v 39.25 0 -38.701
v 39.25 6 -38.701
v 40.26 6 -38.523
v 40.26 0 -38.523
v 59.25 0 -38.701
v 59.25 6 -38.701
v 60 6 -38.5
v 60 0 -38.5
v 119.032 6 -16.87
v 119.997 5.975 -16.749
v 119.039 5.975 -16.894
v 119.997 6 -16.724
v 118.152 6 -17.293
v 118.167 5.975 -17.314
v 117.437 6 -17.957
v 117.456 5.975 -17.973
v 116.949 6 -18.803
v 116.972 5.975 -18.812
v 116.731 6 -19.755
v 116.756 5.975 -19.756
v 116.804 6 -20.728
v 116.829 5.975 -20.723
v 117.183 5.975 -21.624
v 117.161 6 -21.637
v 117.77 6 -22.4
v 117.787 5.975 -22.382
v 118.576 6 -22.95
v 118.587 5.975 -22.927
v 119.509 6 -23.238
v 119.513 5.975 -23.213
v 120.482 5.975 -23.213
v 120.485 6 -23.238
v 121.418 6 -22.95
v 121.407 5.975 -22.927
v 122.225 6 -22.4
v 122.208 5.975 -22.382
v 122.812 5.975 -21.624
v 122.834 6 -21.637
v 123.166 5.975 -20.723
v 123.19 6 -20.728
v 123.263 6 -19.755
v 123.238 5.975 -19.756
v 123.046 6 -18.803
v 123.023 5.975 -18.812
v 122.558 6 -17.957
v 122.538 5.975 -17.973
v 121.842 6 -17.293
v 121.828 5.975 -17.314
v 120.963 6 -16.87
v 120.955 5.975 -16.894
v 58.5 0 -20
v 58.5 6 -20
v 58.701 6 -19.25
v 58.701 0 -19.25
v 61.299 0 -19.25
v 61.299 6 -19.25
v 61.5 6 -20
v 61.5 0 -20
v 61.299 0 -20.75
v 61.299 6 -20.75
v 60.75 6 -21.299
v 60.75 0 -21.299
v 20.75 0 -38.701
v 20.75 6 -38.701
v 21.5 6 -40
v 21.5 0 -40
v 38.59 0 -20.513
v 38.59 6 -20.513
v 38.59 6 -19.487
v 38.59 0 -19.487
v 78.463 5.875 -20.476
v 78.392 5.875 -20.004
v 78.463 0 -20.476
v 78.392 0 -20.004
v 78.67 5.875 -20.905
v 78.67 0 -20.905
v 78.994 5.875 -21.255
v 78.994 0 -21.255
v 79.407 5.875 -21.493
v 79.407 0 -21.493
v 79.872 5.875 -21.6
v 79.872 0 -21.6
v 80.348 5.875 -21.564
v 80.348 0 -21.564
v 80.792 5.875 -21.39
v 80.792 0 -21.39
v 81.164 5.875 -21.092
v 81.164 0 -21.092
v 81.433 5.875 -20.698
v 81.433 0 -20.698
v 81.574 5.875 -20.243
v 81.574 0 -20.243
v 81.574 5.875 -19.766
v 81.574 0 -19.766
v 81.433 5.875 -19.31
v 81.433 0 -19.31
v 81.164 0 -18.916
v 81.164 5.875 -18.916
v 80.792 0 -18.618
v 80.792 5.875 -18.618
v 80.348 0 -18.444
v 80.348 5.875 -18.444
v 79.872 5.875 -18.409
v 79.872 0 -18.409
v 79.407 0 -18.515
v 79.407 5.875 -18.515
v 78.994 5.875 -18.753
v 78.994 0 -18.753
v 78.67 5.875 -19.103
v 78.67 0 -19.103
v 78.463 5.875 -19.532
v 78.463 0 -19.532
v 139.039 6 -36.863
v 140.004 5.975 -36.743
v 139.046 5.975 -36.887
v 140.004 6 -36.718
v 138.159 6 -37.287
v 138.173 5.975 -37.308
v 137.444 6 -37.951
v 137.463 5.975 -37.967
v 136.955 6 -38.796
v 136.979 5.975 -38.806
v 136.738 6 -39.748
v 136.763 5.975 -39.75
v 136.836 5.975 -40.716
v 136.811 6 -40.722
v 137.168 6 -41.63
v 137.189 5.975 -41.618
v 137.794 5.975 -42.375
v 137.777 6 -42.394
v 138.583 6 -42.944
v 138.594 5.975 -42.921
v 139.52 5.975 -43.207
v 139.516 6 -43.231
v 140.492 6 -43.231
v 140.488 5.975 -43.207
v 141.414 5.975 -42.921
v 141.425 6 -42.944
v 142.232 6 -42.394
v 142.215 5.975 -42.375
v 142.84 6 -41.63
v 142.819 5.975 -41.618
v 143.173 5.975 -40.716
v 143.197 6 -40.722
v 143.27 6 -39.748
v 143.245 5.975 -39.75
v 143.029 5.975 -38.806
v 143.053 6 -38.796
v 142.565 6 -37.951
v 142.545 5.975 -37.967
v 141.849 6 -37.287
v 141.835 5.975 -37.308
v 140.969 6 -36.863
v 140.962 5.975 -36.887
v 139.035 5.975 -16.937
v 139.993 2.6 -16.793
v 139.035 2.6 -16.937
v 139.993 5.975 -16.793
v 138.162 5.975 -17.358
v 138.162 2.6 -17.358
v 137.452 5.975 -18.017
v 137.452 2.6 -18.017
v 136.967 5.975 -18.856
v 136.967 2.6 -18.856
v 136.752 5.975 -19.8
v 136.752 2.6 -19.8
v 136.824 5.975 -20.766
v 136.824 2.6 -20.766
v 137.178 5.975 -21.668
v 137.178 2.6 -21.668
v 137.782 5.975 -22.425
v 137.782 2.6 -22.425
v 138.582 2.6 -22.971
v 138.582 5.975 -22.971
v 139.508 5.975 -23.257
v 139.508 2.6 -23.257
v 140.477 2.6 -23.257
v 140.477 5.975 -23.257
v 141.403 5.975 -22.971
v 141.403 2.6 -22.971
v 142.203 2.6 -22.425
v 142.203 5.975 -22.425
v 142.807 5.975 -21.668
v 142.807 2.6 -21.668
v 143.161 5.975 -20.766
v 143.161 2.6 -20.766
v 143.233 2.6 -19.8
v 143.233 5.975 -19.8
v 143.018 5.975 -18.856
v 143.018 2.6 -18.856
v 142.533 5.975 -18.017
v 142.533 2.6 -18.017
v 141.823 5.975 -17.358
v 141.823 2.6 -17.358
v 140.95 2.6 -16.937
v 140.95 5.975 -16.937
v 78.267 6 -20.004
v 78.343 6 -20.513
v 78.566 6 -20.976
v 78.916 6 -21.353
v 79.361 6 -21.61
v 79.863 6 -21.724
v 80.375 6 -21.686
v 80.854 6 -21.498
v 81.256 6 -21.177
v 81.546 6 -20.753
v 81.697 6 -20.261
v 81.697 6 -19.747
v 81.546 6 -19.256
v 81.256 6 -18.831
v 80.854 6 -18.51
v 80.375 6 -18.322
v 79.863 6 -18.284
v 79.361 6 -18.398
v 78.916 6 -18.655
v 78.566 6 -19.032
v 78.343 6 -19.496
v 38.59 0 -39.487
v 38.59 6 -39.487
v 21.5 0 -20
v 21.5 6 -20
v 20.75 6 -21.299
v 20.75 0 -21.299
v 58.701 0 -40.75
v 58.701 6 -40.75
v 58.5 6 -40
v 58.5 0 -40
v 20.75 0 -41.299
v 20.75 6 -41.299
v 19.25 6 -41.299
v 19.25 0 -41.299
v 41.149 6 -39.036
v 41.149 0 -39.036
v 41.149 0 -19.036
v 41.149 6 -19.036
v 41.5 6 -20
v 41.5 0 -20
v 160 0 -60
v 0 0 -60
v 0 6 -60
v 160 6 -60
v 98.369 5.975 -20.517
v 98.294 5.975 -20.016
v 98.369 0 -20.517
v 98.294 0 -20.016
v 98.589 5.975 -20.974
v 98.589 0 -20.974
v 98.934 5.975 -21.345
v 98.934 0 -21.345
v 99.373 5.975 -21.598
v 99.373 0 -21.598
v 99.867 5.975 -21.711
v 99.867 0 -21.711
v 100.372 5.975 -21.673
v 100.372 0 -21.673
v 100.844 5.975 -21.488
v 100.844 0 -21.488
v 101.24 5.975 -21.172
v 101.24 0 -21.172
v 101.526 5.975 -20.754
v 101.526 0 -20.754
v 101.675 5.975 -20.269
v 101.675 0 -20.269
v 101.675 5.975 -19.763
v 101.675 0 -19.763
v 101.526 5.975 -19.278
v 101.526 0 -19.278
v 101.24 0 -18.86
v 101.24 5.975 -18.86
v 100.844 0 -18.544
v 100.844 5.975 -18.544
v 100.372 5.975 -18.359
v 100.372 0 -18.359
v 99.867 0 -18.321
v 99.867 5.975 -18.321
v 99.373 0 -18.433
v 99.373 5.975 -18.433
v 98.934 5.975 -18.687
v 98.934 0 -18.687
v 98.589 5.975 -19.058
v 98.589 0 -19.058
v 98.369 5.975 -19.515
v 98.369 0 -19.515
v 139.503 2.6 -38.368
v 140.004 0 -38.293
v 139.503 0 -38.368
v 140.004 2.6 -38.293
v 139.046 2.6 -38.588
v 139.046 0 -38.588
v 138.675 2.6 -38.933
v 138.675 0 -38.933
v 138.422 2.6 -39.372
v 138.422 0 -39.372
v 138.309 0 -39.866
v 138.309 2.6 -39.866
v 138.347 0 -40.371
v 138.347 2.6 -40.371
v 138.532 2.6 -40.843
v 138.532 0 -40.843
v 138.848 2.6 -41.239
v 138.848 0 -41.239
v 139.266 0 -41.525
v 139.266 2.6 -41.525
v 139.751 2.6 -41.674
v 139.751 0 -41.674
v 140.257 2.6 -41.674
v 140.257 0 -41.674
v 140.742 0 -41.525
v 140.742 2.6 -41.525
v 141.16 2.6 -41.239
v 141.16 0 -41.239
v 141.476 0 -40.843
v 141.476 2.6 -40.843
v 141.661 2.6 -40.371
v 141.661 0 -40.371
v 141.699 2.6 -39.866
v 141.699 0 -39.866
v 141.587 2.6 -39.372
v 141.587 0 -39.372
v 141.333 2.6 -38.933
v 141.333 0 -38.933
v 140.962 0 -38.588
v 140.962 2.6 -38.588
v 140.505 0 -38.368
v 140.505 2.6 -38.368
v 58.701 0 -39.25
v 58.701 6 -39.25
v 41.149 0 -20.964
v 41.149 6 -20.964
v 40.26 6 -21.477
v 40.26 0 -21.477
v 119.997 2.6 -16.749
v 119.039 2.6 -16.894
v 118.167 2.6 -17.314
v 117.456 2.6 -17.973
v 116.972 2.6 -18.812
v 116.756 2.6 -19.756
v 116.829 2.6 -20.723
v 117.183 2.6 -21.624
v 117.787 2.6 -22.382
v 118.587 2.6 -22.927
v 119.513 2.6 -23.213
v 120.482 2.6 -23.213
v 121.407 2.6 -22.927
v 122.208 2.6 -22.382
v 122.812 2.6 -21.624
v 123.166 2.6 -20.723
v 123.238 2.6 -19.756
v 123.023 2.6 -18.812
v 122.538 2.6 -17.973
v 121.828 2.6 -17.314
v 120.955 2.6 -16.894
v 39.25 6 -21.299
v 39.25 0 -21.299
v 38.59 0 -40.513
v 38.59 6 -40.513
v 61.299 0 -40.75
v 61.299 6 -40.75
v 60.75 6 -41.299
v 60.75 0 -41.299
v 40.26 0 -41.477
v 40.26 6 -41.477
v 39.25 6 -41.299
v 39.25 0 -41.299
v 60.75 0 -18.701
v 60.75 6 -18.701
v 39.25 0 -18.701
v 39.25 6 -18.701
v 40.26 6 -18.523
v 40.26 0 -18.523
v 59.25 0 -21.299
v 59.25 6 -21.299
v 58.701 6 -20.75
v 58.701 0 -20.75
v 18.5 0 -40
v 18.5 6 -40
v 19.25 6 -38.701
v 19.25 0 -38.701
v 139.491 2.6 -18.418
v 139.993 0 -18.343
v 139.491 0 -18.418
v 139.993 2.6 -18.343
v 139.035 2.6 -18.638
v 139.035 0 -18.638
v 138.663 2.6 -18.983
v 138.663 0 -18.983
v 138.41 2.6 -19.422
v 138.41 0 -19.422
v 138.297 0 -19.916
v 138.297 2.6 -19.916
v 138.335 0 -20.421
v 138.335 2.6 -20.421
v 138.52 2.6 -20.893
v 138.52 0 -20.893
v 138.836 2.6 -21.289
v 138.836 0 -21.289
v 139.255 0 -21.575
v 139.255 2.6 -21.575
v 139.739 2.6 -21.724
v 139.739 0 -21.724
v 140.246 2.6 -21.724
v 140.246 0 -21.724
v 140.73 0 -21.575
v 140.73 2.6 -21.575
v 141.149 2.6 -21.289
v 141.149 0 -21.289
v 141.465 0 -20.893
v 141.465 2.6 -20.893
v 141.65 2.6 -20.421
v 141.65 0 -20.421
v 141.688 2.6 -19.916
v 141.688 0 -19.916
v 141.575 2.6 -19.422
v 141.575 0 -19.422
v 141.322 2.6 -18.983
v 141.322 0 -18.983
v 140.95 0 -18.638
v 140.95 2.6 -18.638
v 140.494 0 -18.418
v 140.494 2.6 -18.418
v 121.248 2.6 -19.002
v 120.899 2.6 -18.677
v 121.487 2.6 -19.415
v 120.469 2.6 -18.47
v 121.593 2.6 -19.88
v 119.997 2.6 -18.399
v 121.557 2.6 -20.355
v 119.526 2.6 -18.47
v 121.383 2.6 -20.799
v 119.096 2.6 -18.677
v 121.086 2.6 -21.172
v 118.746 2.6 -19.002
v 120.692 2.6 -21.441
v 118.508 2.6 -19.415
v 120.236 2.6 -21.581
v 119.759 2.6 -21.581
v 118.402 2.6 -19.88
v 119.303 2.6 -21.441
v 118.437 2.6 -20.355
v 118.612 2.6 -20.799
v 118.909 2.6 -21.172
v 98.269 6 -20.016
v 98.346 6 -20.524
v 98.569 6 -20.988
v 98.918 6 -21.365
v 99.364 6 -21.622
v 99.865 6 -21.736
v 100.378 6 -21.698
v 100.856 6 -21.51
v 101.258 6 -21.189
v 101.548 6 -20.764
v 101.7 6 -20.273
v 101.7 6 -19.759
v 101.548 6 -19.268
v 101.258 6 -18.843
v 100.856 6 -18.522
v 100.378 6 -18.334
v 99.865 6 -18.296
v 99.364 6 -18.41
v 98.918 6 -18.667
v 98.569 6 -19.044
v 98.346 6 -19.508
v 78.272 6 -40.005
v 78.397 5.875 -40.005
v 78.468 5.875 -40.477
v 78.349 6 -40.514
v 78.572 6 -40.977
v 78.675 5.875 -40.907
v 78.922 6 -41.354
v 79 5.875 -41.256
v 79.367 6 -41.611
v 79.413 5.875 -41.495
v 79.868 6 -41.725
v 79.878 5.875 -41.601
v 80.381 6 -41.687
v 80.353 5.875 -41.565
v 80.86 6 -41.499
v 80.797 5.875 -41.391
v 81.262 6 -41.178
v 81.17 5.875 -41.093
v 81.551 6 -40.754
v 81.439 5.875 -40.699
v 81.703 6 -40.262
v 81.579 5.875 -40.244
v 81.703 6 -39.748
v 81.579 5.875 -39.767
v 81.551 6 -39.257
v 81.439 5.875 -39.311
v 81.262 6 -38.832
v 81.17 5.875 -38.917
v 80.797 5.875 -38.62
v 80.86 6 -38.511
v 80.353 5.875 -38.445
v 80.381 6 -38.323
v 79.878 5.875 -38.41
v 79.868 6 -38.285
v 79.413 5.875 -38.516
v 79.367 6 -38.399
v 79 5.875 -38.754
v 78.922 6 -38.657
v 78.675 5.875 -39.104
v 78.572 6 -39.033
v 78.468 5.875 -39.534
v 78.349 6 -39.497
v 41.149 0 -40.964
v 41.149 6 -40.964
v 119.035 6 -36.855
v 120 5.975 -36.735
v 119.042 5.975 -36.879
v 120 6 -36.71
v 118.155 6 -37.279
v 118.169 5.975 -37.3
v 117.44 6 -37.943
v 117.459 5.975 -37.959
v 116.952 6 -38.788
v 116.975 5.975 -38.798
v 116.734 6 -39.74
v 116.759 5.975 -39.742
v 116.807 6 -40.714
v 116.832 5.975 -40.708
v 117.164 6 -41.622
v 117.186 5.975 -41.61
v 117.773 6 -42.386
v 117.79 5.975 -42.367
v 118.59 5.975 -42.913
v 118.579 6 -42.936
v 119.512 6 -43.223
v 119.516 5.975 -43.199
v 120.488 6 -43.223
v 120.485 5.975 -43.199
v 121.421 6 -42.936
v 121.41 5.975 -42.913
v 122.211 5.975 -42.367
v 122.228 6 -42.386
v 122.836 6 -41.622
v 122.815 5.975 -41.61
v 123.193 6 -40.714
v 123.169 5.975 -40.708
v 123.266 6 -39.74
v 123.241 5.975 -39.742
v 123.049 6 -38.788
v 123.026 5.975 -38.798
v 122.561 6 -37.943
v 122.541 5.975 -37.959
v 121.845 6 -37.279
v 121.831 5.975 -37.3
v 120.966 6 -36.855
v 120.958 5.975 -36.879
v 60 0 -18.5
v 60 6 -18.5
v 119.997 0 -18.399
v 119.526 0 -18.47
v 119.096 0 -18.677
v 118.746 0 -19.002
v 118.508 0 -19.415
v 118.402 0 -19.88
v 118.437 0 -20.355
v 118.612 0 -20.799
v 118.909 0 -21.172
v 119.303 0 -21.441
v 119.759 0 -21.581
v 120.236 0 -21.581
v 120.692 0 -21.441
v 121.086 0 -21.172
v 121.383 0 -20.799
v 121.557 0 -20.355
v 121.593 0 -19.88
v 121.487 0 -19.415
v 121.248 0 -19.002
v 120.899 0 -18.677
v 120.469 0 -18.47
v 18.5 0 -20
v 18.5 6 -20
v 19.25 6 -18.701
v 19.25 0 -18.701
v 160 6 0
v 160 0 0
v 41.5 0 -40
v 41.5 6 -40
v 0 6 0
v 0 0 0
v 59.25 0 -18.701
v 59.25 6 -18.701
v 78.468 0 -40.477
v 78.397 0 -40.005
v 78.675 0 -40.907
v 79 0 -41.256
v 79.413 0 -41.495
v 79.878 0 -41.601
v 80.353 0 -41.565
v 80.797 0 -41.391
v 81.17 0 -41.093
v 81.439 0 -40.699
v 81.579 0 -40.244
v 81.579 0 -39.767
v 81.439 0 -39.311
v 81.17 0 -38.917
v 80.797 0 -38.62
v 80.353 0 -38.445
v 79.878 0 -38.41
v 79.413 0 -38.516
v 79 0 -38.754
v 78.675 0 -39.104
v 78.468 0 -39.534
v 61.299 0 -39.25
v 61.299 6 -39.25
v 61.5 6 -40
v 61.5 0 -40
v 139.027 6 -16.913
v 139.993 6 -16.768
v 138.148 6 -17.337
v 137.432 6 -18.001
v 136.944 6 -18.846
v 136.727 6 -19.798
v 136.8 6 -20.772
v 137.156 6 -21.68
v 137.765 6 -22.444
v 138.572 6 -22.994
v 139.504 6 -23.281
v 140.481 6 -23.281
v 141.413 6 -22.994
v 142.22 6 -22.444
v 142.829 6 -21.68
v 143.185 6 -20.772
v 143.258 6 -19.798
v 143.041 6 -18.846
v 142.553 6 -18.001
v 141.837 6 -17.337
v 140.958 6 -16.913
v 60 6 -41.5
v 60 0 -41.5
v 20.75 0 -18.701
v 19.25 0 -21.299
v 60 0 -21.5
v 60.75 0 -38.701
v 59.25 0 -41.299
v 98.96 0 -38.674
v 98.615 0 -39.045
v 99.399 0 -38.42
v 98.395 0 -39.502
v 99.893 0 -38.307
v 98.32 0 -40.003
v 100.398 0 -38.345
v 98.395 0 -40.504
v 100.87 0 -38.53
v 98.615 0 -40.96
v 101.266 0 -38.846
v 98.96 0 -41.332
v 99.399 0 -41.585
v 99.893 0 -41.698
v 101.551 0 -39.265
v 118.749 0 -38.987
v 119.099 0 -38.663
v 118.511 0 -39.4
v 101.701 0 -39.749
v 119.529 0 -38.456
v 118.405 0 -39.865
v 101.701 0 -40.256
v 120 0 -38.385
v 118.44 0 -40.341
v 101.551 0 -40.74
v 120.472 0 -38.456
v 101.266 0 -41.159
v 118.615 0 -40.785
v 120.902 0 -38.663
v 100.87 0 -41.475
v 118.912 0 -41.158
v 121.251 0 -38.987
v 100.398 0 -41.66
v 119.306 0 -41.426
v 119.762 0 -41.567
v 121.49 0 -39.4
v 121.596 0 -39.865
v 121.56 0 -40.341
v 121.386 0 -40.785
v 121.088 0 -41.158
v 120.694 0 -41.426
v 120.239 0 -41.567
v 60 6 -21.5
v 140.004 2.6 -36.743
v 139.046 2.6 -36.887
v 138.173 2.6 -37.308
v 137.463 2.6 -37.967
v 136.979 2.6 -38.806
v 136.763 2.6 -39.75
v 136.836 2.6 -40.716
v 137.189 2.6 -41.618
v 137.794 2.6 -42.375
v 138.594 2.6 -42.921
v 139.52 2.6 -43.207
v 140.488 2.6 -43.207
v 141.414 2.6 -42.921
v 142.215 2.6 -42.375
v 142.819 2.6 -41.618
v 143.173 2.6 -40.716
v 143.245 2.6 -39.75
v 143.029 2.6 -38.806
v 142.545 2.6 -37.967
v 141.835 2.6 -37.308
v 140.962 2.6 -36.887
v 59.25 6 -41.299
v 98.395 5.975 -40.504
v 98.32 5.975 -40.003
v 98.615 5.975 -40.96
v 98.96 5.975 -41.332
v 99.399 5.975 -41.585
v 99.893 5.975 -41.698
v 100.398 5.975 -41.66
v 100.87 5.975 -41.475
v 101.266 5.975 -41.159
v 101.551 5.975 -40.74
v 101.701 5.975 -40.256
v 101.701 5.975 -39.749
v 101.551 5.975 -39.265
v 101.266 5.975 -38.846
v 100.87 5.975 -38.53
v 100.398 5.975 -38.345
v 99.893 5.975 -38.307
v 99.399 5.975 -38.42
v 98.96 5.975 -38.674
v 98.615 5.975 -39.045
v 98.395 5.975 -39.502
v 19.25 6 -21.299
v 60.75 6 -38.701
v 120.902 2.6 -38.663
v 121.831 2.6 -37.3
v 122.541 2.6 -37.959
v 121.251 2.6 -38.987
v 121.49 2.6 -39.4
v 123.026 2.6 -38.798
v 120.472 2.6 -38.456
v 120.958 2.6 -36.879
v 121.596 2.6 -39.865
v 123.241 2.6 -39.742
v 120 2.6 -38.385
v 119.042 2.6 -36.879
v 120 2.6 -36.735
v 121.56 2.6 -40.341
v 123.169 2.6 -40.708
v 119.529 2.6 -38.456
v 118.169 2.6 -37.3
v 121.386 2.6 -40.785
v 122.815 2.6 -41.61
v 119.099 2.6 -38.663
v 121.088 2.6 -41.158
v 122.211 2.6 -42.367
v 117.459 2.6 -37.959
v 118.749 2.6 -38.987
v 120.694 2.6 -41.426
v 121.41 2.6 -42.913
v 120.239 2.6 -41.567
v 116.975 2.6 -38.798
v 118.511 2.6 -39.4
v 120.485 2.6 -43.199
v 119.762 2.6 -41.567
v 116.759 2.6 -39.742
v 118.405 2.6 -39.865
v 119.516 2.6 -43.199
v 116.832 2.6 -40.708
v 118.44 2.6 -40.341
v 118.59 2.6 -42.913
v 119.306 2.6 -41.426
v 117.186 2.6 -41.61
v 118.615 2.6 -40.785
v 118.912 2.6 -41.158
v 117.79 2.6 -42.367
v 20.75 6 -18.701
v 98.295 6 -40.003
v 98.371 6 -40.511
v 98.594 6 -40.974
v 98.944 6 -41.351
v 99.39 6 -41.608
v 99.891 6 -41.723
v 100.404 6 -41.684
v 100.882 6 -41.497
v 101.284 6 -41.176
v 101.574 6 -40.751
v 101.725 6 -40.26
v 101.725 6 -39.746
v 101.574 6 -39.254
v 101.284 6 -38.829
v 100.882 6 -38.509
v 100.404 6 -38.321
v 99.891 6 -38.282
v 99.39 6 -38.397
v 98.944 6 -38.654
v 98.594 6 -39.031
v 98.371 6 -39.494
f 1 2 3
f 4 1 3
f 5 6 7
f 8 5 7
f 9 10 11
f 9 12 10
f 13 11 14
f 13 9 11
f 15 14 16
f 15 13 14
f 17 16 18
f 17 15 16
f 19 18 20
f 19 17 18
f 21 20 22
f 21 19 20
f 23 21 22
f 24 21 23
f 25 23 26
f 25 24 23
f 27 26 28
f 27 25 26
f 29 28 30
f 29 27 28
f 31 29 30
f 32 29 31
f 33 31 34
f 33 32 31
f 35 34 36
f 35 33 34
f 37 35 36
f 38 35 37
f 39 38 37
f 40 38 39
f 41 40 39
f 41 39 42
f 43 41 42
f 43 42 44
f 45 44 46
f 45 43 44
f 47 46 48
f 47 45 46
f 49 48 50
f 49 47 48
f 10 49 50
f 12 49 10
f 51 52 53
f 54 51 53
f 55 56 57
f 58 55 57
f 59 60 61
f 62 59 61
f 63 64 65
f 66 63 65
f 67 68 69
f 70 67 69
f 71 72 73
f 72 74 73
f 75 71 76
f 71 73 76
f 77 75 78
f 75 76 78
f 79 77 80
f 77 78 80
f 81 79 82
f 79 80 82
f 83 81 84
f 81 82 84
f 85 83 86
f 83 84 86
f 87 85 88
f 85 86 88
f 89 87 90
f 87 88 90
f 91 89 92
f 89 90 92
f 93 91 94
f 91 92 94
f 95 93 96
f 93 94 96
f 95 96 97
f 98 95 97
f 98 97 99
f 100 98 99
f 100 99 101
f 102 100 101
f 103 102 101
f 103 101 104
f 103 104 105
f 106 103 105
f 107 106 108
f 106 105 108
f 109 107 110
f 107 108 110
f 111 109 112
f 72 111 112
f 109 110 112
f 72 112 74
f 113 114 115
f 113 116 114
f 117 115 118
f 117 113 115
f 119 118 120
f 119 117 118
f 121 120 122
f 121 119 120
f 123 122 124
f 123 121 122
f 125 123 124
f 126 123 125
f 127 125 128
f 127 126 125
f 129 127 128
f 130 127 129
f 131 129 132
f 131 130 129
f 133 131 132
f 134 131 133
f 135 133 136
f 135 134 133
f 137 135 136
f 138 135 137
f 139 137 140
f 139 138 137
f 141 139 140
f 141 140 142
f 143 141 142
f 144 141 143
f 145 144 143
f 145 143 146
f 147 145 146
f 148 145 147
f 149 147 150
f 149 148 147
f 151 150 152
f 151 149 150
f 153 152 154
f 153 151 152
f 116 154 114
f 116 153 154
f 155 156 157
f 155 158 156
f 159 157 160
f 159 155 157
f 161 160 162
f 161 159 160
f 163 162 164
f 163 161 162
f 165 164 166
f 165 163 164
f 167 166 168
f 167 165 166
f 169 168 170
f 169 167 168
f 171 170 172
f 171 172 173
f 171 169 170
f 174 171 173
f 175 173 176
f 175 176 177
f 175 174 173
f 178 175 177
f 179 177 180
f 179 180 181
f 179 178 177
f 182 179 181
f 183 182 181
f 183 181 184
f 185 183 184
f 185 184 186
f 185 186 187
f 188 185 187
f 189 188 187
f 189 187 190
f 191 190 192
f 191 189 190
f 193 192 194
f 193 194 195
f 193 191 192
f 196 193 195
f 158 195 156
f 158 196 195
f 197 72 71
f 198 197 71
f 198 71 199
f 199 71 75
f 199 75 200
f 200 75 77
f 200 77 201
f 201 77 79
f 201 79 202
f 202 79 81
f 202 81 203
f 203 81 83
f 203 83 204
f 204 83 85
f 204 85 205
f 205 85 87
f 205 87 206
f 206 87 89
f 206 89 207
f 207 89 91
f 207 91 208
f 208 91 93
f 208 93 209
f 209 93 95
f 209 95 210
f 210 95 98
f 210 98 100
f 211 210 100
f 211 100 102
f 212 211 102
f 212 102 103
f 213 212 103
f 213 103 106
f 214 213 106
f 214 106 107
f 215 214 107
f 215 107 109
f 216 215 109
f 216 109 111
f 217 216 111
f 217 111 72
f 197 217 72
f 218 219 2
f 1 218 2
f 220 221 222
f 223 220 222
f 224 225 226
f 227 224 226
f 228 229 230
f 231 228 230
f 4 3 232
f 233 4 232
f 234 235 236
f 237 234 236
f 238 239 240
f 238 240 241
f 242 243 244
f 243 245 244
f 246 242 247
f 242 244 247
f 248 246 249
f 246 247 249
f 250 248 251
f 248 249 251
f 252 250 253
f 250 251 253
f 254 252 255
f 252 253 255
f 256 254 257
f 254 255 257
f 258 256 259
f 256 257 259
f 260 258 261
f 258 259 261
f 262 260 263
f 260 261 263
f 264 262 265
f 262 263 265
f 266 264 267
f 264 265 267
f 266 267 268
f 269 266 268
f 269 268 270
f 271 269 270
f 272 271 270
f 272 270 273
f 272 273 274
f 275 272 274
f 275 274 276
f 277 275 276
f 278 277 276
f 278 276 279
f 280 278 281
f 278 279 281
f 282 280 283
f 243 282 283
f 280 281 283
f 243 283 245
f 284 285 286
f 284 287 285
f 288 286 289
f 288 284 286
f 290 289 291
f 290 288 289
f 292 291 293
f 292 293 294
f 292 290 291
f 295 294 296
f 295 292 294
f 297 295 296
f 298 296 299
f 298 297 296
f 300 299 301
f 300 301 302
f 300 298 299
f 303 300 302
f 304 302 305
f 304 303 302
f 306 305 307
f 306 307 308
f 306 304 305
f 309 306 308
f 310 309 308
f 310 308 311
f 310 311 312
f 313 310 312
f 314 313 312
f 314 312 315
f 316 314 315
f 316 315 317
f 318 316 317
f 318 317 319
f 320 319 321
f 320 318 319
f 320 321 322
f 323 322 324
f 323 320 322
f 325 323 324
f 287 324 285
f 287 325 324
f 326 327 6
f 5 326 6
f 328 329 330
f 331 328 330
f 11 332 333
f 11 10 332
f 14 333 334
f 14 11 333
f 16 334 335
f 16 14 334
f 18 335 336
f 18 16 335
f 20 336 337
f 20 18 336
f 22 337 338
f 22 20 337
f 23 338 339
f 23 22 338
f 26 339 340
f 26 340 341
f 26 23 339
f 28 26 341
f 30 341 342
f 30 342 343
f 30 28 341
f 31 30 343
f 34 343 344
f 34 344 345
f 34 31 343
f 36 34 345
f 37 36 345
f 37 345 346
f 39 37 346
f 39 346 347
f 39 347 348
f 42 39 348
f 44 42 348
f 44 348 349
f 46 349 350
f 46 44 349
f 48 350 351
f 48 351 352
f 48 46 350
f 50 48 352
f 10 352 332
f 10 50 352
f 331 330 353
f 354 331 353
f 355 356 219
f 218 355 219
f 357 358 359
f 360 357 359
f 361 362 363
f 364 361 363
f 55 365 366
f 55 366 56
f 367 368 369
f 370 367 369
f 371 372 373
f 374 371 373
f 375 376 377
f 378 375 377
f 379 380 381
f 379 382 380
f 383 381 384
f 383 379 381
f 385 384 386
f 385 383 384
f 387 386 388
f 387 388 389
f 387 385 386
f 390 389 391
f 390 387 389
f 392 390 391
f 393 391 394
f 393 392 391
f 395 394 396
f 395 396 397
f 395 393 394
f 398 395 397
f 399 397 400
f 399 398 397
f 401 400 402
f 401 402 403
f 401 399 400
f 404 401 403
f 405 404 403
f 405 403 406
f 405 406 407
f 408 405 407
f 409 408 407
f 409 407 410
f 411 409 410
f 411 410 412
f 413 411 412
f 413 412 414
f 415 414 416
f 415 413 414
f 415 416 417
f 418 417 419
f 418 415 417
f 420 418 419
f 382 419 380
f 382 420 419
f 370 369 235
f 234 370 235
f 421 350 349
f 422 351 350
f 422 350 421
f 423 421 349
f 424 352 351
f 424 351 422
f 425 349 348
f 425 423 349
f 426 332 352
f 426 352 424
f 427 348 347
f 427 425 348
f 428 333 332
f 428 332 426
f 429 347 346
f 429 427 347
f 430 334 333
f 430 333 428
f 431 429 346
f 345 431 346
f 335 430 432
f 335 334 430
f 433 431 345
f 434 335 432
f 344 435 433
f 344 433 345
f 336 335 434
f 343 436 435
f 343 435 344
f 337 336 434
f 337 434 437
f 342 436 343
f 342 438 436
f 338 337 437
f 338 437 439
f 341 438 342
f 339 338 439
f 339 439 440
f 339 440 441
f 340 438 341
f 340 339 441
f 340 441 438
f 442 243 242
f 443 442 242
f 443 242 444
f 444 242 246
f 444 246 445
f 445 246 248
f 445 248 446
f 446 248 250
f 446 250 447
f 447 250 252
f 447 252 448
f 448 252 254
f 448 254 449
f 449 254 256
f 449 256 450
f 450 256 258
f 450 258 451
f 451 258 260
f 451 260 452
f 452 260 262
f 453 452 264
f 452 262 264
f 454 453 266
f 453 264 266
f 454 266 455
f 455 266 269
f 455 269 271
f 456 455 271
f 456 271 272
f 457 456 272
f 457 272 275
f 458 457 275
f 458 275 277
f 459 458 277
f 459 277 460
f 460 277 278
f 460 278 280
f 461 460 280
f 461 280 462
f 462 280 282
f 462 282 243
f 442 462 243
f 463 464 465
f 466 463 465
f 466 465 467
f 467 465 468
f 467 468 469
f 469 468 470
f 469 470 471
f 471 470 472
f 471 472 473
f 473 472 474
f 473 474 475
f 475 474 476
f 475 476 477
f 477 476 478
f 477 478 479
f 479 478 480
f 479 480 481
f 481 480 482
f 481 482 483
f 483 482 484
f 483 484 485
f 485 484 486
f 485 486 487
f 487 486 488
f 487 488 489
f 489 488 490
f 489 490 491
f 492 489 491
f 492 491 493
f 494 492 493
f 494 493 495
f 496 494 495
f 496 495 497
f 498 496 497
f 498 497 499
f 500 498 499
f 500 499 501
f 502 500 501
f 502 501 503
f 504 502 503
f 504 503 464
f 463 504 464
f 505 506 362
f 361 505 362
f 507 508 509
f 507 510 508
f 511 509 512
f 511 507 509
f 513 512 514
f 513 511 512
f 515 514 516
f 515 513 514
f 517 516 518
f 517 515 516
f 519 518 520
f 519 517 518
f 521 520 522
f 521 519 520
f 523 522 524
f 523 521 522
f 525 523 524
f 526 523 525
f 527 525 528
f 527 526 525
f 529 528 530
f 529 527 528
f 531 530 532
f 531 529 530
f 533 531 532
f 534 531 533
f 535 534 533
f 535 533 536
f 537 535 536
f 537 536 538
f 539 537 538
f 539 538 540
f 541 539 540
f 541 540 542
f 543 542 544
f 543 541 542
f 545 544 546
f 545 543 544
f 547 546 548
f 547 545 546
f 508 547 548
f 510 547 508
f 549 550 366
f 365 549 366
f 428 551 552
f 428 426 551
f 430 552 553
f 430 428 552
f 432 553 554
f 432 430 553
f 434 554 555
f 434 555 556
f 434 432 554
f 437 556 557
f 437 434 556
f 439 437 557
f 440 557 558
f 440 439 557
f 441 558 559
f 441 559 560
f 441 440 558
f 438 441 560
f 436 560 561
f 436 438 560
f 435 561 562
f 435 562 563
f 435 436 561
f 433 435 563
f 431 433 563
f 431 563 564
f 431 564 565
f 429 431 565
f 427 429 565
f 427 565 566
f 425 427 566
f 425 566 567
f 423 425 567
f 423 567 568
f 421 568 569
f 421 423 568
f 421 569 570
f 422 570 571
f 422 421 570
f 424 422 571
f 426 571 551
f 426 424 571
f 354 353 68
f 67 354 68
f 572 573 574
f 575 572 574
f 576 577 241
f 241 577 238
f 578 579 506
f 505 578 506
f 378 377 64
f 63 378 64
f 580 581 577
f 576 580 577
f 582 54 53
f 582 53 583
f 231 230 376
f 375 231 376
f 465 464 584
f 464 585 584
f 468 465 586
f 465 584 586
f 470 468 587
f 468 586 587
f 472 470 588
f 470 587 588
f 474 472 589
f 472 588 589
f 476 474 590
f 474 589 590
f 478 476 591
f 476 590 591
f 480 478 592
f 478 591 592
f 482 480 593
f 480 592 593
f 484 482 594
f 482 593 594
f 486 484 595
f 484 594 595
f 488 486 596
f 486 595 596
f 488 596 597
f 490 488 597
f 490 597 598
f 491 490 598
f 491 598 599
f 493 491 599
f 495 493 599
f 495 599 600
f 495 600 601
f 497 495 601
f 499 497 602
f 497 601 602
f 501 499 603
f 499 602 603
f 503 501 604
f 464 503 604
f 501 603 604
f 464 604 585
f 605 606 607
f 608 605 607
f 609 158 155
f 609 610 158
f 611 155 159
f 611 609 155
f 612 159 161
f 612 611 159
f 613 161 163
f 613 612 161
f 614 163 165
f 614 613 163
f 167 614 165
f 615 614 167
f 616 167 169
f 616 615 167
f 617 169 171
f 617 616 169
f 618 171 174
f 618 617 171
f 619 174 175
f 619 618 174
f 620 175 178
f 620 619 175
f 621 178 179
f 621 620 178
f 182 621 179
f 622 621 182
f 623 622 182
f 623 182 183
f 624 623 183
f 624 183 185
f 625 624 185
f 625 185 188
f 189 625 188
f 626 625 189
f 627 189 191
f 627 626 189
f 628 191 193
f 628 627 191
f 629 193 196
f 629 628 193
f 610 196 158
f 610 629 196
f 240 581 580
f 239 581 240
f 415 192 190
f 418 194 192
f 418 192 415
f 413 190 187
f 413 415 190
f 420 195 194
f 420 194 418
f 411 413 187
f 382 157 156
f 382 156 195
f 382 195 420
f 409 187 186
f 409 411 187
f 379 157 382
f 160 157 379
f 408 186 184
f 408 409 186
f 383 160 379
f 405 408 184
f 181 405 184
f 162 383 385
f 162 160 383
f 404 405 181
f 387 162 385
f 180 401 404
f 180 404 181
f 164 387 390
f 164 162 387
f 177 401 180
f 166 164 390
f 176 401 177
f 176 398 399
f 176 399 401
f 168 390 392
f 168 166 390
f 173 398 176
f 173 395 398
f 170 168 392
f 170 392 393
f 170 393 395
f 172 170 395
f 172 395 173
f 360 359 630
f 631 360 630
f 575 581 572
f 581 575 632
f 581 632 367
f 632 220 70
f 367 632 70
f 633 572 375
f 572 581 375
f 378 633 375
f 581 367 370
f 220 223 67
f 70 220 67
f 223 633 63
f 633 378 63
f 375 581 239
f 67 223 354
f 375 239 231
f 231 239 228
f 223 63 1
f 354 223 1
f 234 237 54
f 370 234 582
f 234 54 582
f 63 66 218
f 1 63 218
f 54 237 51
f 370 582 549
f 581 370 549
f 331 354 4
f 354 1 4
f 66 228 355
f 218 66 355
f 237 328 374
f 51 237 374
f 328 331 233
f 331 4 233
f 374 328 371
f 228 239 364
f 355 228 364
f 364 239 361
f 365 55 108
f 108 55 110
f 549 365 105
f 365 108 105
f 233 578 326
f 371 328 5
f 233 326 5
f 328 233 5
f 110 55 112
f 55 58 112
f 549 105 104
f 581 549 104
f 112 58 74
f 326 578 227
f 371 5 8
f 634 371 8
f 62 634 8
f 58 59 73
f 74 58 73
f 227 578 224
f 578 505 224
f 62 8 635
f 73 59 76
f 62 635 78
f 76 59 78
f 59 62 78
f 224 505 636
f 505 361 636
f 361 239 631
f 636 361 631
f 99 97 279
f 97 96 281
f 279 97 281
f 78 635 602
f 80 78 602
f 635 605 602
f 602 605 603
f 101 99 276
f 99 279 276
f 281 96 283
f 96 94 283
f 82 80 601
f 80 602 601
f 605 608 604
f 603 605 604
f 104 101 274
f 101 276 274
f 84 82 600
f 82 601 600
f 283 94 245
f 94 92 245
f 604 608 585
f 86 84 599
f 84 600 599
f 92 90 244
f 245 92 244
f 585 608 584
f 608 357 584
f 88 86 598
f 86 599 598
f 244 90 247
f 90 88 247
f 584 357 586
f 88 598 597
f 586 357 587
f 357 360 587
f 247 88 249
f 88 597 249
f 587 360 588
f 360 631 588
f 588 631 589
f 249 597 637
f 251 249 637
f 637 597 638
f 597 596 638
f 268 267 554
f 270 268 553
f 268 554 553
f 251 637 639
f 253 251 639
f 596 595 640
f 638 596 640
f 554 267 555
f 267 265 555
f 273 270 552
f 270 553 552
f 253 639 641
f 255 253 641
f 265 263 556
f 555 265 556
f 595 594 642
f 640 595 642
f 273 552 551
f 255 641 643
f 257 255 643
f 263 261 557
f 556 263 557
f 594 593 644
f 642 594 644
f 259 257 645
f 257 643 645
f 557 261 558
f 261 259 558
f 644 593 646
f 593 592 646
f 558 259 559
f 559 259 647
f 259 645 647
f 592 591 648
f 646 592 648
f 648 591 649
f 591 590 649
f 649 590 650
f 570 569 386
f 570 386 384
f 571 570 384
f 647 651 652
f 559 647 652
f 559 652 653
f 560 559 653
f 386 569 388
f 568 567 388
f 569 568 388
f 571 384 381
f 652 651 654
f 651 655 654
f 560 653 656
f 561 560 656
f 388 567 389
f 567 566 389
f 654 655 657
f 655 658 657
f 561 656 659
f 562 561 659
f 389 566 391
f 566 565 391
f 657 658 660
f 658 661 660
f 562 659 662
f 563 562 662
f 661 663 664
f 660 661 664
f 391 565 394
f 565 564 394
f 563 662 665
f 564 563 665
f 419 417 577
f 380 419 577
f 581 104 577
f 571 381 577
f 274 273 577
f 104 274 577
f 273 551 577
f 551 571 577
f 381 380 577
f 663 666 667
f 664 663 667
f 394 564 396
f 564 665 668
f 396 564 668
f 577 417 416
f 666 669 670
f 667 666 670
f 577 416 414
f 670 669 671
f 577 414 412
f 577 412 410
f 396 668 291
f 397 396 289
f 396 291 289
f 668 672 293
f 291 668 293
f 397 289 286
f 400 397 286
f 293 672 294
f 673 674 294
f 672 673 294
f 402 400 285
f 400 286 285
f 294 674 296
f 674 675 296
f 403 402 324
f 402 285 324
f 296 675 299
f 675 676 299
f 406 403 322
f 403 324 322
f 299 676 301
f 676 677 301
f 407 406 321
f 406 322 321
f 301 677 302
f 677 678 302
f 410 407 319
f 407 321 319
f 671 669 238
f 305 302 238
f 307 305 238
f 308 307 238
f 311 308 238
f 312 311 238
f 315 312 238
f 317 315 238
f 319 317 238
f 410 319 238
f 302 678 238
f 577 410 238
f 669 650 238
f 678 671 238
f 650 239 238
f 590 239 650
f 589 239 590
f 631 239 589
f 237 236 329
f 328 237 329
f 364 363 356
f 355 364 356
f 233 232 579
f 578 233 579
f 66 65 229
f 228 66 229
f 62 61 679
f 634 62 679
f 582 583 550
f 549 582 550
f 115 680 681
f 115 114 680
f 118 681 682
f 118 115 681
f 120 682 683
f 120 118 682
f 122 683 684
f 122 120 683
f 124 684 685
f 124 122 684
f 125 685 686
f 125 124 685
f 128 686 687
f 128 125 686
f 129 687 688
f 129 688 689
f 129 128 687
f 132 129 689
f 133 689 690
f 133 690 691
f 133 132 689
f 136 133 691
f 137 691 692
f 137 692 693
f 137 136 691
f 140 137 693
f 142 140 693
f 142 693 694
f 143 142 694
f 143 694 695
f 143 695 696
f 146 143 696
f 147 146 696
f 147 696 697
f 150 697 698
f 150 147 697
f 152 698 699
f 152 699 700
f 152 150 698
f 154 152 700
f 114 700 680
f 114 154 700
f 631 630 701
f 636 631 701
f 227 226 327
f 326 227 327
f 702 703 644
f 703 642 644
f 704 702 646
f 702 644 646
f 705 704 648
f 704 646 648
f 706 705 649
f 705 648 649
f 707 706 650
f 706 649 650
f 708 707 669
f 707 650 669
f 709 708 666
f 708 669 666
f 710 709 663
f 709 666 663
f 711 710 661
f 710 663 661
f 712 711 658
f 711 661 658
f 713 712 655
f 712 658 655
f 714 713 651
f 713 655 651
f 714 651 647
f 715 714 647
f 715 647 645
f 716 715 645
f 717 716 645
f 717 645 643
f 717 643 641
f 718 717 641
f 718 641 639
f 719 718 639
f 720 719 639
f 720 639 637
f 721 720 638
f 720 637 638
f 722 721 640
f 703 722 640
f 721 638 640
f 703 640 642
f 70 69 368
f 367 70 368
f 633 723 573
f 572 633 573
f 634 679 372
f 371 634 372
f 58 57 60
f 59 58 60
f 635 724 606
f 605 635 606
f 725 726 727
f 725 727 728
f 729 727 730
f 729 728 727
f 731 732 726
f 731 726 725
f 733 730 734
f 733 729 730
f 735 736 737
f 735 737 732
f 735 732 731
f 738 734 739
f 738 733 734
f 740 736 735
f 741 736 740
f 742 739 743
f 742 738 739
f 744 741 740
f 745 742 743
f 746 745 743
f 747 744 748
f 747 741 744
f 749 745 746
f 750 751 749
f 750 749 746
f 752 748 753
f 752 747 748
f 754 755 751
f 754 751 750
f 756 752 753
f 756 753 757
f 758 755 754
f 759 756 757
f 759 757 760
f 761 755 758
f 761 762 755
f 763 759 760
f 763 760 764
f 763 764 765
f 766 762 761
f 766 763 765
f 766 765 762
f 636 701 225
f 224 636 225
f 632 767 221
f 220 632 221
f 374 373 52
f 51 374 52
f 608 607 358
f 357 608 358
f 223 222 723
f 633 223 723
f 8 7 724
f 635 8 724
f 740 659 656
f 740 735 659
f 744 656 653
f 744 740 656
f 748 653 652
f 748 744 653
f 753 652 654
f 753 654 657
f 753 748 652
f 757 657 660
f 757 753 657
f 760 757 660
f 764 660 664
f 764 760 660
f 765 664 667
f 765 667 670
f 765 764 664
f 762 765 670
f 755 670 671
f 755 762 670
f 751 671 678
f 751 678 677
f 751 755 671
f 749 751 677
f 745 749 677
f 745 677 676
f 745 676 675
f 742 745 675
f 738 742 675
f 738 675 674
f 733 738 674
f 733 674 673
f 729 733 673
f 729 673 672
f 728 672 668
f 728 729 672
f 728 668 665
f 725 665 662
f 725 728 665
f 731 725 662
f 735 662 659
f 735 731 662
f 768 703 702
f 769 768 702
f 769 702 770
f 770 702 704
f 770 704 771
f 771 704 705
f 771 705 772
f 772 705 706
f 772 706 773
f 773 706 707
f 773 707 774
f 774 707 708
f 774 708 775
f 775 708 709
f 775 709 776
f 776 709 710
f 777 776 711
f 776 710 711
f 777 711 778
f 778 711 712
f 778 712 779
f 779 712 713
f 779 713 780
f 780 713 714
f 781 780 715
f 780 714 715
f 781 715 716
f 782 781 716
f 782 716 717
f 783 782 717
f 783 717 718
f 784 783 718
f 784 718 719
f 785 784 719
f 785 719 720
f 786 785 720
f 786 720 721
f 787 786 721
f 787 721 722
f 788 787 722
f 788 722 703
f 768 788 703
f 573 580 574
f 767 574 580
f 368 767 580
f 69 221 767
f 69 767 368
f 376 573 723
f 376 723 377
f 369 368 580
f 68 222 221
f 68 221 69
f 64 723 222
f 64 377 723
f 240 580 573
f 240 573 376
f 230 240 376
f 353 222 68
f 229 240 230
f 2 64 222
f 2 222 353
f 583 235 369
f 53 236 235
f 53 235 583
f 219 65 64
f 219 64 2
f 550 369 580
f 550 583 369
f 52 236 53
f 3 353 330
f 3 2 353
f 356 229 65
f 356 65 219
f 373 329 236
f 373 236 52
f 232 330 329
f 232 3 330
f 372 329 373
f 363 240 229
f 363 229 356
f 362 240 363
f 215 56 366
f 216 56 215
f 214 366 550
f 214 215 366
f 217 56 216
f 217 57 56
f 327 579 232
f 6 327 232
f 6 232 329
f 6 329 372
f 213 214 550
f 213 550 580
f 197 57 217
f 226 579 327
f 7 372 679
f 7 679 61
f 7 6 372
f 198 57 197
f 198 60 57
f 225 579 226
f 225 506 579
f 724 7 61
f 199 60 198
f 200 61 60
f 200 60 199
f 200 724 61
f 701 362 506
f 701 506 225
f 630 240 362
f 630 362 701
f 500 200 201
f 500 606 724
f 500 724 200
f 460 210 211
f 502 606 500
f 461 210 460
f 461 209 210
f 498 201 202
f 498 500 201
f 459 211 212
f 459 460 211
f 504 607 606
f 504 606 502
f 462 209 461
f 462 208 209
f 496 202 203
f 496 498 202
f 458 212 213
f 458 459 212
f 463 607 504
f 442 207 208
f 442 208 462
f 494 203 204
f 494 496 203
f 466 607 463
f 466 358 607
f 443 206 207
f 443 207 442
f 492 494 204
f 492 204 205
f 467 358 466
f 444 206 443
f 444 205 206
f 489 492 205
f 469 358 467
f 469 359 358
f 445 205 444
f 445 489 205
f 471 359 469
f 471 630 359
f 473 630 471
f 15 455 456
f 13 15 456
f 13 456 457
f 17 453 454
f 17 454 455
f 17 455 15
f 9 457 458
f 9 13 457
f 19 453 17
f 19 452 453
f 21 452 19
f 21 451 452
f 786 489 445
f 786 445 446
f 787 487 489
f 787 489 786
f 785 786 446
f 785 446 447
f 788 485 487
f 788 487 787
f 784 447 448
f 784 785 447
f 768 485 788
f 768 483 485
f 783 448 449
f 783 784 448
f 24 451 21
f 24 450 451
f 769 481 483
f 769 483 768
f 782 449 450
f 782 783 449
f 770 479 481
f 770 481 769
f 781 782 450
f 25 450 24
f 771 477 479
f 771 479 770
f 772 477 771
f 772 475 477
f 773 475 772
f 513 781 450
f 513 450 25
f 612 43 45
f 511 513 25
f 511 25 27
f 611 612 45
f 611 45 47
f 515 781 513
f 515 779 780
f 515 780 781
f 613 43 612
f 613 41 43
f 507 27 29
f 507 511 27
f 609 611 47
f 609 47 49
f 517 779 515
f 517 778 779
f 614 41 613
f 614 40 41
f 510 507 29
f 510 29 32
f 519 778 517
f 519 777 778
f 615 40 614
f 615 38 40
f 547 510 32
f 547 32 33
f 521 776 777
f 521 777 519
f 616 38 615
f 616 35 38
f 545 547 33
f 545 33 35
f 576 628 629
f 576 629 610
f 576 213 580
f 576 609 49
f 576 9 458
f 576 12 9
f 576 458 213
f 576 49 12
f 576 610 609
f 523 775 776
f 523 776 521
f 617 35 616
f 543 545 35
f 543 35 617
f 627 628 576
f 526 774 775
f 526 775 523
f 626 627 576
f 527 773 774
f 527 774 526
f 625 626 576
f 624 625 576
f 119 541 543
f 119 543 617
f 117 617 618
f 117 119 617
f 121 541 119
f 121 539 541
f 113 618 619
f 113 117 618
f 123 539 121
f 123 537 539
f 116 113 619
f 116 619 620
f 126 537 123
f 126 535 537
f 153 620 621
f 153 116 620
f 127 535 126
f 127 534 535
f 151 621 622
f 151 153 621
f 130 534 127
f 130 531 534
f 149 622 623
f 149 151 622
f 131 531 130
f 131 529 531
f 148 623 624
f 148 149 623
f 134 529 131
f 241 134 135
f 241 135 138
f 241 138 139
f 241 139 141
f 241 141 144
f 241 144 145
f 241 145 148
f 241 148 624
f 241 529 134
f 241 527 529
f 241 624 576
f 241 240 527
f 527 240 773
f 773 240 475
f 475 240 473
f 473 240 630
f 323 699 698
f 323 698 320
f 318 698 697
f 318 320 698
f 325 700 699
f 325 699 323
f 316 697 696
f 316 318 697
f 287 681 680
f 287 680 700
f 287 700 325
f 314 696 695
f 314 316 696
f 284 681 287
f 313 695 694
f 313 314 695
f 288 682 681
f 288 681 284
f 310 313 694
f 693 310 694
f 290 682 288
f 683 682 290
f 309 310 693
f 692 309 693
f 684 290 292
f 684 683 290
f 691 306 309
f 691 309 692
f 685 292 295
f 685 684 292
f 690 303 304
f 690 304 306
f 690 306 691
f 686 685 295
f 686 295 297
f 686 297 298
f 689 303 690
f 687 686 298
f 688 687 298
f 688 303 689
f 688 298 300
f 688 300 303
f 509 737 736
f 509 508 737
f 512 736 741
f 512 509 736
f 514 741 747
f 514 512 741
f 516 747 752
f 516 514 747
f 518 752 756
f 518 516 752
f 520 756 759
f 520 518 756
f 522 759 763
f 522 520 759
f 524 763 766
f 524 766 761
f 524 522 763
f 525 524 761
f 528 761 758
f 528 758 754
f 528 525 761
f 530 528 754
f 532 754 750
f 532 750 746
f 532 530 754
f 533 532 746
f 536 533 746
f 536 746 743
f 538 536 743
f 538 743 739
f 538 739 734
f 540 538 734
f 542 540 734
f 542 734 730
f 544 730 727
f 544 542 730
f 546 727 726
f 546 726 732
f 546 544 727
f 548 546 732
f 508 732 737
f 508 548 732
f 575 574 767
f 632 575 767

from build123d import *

# Parameters (mm, degrees)
SKETCH1_W                      = 160
SKETCH1_H                      = 60
BOSS_EXTRUDE1_DEPTH            = 6
M3_CLEARANCE_HOLE1_D           = 3.4
M3_CLEARANCE_HOLE1_CSINK_D     = 3.45
M3_CLEARANCE_HOLE1_CSINK_ANGLE = 90
M3_CLEARANCE_HOLE3_D           = 3.4
M3_CLEARANCE_HOLE3_CSINK_D     = 3.45
M3_CLEARANCE_HOLE3_CSINK_ANGLE = 90
M3_CLEARANCE_HOLE4_D           = 3.2
M3_CLEARANCE_HOLE4_CSINK_D     = 3.45
M3_CLEARANCE_HOLE4_CSINK_ANGLE = 90
M3_CLEARANCE_HOLE5_D           = 3.2
M3_CLEARANCE_HOLE5_CSINK_D     = 3.45
M3_CLEARANCE_HOLE5_CSINK_ANGLE = 90
CUT_EXTRUDE3_DEPTH             = 171.985379492
CUT_EXTRUDE4_DEPTH             = 171.985379492
CUT_EXTRUDE5_DEPTH             = 171.985379492
CUT_EXTRUDE6_DEPTH             = 171.985379492
CUT_EXTRUDE7_DEPTH             = 171.985379492
CUT_EXTRUDE8_DEPTH             = 171.985379492


with BuildPart() as part:
    # Sketch1 → Boss-Extrude1 (new body)
    with BuildSketch(Plane(origin=(0, 0, 0), x_dir=(1, 0, 0), z_dir=(0, 1, 0))):
        with Locations((80, 30)):
            Rectangle(SKETCH1_W, SKETCH1_H)
    extrude(amount=BOSS_EXTRUDE1_DEPTH)

    # Sketch4 → CBORE for M3 Hex Socket Head Cap Screw1 (revolve, cut)
    with BuildSketch(Plane(origin=(139.992504276, 6, -20.042969634), x_dir=(0, 0, 1), z_dir=(1, 0, 0))):
        Polygon((0, 0), (0, 6), (1.7, 6), (1.7, 3.4), (3.25, 3.4), (3.25, 0.025), (3.275, 0), align=None)
    revolve(axis=Axis((139.992504276, 12.35, -20.042969634), (0, -1, 0)), mode=Mode.SUBTRACT)

    # Sketch7 → CBORE for M3 Hex Socket Head Cap Screw2 (revolve, cut)
    with BuildSketch(Plane(origin=(140.004074622, 6, -39.992947499), x_dir=(0, 0, 1), z_dir=(1, 0, 0))):
        Polygon((0, 0), (0, 6), (1.7, 6), (1.7, 3.4), (3.25, 3.4), (3.25, 0.025), (3.275, 0), align=None)
    revolve(axis=Axis((140.004074622, 12.35, -39.992947499), (0, -1, 0)), mode=Mode.SUBTRACT)

    # Sketch10 → CBORE for M3 Hex Socket Head Cap Screw3 (revolve, cut)
    with BuildSketch(Plane(origin=(120.000202739, 6, -39.984949452), x_dir=(0, 0, 1), z_dir=(1, 0, 0))):
        Polygon((0, 0), (0, 6), (1.6, 6), (1.6, 3.4), (3.25, 3.4), (3.25, 0.025), (3.275, 0), align=None)
    revolve(axis=Axis((120.000202739, 12.35, -39.984949452), (0, -1, 0)), mode=Mode.SUBTRACT)

    # Sketch13 → CBORE for M3 Hex Socket Head Cap Screw4 (revolve, cut)
    with BuildSketch(Plane(origin=(119.997329442, 6, -19.99932447), x_dir=(0, 0, 1), z_dir=(1, 0, 0))):
        Polygon((0, 0), (0, 6), (1.6, 6), (1.6, 3.4), (3.25, 3.4), (3.25, 0.025), (3.275, 0), align=None)
    revolve(axis=Axis((119.997329442, 12.35, -19.99932447), (0, -1, 0)), mode=Mode.SUBTRACT)

    # M3 Clearance Hole1 (through all)
    with Locations(Plane(origin=(0, 6, 0), x_dir=(1, 0, 0), z_dir=(0, 1, 0))):
        with Locations((100.019720451, 40.002637401)):
            CounterSinkHole(M3_CLEARANCE_HOLE1_D / 2, M3_CLEARANCE_HOLE1_CSINK_D / 2, counter_sink_angle=M3_CLEARANCE_HOLE1_CSINK_ANGLE)

    # M3 Clearance Hole3 (through all)
    with Locations(Plane(origin=(0, 6, 0), x_dir=(1, 0, 0), z_dir=(0, 1, 0))):
        with Locations((99.99392625, 20.015973)):
            CounterSinkHole(M3_CLEARANCE_HOLE3_D / 2, M3_CLEARANCE_HOLE3_CSINK_D / 2, counter_sink_angle=M3_CLEARANCE_HOLE3_CSINK_ANGLE)

    # M3 Clearance Hole4 (through all)
    with Locations(Plane(origin=(0, 6, 0), x_dir=(1, 0, 0), z_dir=(0, 1, 0))):
        with Locations((79.997225907, 40.005191988)):
            CounterSinkHole(M3_CLEARANCE_HOLE4_D / 2, M3_CLEARANCE_HOLE4_CSINK_D / 2, counter_sink_angle=M3_CLEARANCE_HOLE4_CSINK_ANGLE)

    # M3 Clearance Hole5 (through all)
    with Locations(Plane(origin=(0, 6, 0), x_dir=(1, 0, 0), z_dir=(0, 1, 0))):
        with Locations((79.991526723, 20.004071528)):
            CounterSinkHole(M3_CLEARANCE_HOLE5_D / 2, M3_CLEARANCE_HOLE5_CSINK_D / 2, counter_sink_angle=M3_CLEARANCE_HOLE5_CSINK_ANGLE)

    # Sketch2 → Cut-Extrude3 (cut, through all)
    with BuildSketch(Plane(origin=(0, 6, 0), x_dir=(1, 0, 0), z_dir=(0, 1, 0))):
        Polygon((61.499825244, 20.000000122), (61.29888673, 20.749912866), (60.7499125, 21.298887096), (59.999999756, 21.49982561), (59.250087012, 21.298887096), (58.701112782, 20.749912866), (58.500174268, 20.000000122), (58.701112782, 19.250087378), (59.250087012, 18.701113148), (59.999999756, 18.500174634), (60.7499125, 18.701113148), (61.29888673, 19.250087378), align=None)
    extrude(amount=-CUT_EXTRUDE3_DEPTH, mode=Mode.SUBTRACT)

    # Sketch35 → Cut-Extrude4 (cut, through all)
    with BuildSketch(Plane(origin=(0, 6, 0), x_dir=(1, 0, 0), z_dir=(0, 1, 0))):
        Polygon((58.500006975, 40), (58.700967935, 39.250003488), (59.250003488, 38.700967935), (60, 38.500006975), (60.749996512, 38.700967935), (61.299032065, 39.250003488), (61.499993025, 40), (61.299032065, 40.749996512), (60.749996512, 41.299032065), (60, 41.499993025), (59.250003488, 41.299032065), (58.700967935, 40.749996512), align=None)
    extrude(amount=-CUT_EXTRUDE4_DEPTH, mode=Mode.SUBTRACT)

    # Sketch36 → Cut-Extrude5 (cut, through all)
    with BuildSketch(Plane(origin=(0, 6, 0), x_dir=(1, 0, 0), z_dir=(0, 1, 0))):
        Polygon((41.5, 20), (41.149066665, 20.964181415), (40.260472267, 21.47721163), (39.25, 21.299038106), (38.590461069, 20.513030215), (38.590461069, 19.486969785), (39.25, 18.700961894), (40.260472267, 18.52278837), (41.149066665, 19.035818585), align=None)
    extrude(amount=-CUT_EXTRUDE5_DEPTH, mode=Mode.SUBTRACT)

    # Sketch37 → Cut-Extrude6 (cut, through all)
    with BuildSketch(Plane(origin=(0, 6, 0), x_dir=(1, 0, 0), z_dir=(0, 1, 0))):
        Polygon((41.5, 40), (41.149066665, 40.964181415), (40.260472267, 41.47721163), (39.25, 41.299038106), (38.590461069, 40.513030215), (38.590461069, 39.486969785), (39.25, 38.700961894), (40.260472267, 38.52278837), (41.149066665, 39.035818585), align=None)
    extrude(amount=-CUT_EXTRUDE6_DEPTH, mode=Mode.SUBTRACT)

    # Sketch38 → Cut-Extrude7 (cut, through all)
    with BuildSketch(Plane(origin=(0, 6, 0), x_dir=(1, 0, 0), z_dir=(0, 1, 0))):
        Polygon((21.5, 20), (20.75, 21.299038106), (19.25, 21.299038106), (18.5, 20), (19.25, 18.700961894), (20.75, 18.700961894), align=None)
    extrude(amount=-CUT_EXTRUDE7_DEPTH, mode=Mode.SUBTRACT)

    # Sketch39 → Cut-Extrude8 (cut, through all)
    with BuildSketch(Plane(origin=(0, 6, 0), x_dir=(1, 0, 0), z_dir=(0, 1, 0))):
        Polygon((21.5, 40), (20.75, 41.299038106), (19.25, 41.299038106), (18.5, 40), (19.25, 38.700961894), (20.75, 38.700961894), align=None)
    extrude(amount=-CUT_EXTRUDE8_DEPTH, mode=Mode.SUBTRACT)


solid = part.part
